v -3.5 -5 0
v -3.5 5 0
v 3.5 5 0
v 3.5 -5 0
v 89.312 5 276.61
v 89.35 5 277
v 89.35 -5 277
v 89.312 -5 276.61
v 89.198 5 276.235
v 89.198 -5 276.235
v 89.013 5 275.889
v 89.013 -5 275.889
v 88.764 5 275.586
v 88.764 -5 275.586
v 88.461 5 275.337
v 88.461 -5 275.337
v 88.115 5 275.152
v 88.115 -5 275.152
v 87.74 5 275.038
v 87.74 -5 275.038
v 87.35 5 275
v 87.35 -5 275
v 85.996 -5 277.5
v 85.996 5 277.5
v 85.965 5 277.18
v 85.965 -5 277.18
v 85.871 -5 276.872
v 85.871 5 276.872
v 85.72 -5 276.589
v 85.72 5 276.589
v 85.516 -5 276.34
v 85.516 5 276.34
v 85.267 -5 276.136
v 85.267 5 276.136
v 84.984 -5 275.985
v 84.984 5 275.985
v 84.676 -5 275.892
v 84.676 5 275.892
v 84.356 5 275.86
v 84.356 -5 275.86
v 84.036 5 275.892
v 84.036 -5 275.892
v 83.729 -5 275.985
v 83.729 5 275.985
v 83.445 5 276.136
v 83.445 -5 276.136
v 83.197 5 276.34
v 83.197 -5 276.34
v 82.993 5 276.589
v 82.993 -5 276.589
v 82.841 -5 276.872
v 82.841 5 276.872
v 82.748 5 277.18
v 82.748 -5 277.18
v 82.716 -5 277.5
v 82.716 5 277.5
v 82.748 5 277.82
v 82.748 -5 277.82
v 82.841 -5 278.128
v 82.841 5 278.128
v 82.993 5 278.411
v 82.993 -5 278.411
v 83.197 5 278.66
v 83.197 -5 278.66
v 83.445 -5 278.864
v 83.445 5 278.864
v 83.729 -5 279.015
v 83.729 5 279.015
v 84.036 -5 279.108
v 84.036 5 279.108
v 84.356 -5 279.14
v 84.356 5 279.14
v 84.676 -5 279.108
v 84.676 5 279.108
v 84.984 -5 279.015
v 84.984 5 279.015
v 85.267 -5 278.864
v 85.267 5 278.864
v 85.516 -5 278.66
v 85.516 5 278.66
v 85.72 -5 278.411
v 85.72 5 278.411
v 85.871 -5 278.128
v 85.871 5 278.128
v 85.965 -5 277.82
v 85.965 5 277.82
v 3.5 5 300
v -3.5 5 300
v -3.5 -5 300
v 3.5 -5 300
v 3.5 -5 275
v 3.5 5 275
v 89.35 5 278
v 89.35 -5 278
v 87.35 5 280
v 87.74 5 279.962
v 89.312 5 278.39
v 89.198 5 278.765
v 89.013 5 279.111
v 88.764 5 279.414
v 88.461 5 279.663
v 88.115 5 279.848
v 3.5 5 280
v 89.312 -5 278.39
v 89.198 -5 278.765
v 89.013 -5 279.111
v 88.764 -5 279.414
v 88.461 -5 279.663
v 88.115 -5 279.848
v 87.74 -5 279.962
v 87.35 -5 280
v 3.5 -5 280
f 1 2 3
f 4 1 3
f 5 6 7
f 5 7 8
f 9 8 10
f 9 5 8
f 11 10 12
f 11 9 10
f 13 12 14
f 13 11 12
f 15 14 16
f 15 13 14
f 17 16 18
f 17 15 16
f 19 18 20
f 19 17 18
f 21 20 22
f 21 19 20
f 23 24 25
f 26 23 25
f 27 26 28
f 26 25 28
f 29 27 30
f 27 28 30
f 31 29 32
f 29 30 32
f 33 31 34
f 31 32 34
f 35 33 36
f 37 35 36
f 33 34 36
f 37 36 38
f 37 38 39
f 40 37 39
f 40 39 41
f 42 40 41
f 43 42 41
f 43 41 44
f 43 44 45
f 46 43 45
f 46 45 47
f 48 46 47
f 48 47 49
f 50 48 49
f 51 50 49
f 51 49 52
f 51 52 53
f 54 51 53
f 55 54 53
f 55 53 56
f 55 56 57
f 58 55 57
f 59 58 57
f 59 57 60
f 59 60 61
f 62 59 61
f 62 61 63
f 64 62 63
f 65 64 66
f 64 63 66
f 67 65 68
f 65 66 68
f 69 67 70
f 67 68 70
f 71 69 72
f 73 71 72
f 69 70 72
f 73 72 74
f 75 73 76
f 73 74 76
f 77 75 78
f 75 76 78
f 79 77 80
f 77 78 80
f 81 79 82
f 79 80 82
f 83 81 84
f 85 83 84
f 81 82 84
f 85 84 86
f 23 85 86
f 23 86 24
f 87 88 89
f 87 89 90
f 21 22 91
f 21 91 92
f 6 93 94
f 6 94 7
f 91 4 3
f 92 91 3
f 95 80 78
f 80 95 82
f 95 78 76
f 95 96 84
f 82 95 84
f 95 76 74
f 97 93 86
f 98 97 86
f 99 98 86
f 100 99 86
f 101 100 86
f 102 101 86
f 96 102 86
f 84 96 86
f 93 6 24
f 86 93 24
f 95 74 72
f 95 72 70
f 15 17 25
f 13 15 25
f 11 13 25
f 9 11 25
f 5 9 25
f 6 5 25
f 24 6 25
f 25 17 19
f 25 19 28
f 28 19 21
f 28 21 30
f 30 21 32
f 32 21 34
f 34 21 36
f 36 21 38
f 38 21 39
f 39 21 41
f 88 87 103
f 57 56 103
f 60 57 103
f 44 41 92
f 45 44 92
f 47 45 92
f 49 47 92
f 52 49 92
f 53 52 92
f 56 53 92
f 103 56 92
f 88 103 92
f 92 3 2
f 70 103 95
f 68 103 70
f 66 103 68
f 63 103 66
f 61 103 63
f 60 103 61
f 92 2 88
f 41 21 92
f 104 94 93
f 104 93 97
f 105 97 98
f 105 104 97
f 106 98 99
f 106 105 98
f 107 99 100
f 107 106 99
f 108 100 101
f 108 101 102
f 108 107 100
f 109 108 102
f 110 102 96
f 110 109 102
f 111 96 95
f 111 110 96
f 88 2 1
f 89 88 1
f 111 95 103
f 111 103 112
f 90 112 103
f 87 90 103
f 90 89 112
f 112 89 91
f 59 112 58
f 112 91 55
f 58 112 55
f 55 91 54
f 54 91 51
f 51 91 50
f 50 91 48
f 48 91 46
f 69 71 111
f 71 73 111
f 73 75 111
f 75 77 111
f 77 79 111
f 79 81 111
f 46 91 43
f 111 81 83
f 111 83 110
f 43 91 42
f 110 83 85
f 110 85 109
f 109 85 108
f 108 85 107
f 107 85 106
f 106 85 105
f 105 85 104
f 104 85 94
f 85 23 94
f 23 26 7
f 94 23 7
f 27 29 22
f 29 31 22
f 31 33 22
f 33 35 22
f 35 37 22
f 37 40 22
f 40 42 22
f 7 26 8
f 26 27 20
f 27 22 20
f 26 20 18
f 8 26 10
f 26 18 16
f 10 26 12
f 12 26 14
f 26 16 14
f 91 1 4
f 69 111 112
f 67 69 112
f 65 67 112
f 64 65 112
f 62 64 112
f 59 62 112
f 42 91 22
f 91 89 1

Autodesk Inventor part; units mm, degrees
ref_plane "YZ Plane" through (0, 0, 0) normal (1, 0, 0) x (0, 1, 0)
ref_plane "XZ Plane" through (0, 0, 0) normal (0, 1, 0) x (-1, 0, 0)
ref_plane "XY Plane" through (0, 0, 0) normal (0, 0, 1) x (1, 0, 0)
sketch "Sketch1" plane through (0, 0, 0) normal (0, 0, 1) x (1, 0, 0)
  line L0 (-3.5, -5) -> (3.5, -5)
  line L1 (3.5, -5) -> (3.5, 5)
  line L2 (3.5, 5) -> (-3.5, 5)
  line L3 (-3.5, 5) -> (-3.5, -5)
  line L4 (-3.5, -5) -> (3.5, 5) construction
  line L5 (3.5, -5) -> (-3.5, 5) construction
  point P0 (0, 0)
  dimension "d0" = 7
  dimension "d1" = 10
extrude "Extrusion1" add sketch "Sketch1" along normal blind 300
sketch "Sketch2" plane through (3.5, -5, 0) normal (1, 0, 0) x (0, 0, -1)
  point P0 (0, 5)
sketch "Sketch3" plane through (3.5, -5, 0) normal (1, 0, 0) x (0, 0, -1)
  line L0 (0, 10) -> (-300, 10) projected
  line L1 (0, 0) -> (-300, 0) projected
  line L2 (-275, 10) -> (-280, 10)
  line L3 (-280, 10) -> (-280, 0)
  line L4 (-280, 0) -> (-275, 0)
  line L5 (-275, 0) -> (-275, 10)
  line L6 (-300, 0) -> (-300, 10) projected
  point P0 (0, 5)
  point P1 (-275, 0)
  point P2 (-280, 10)
  dimension "d4" = 5
  dimension "d12" = 20
extrude "Extrusion2" add sketch "Sketch3" along normal blind 85.85 contours L5 L1 L3 L0
sketch "Sketch4" plane through (-3.5, 5, 300) normal (0, 1, 0) x (1, 0, 0)
  circle A0 centre (87.8562, 22.5) radius 1.64
  line L0 (7, 25) -> (92.85, 25) projected
  point P0 (3.5, 300)
  dimension "d7" = 3.28
  dimension "d8" = 2.5
extrude "Extrusion3" cut sketch "Sketch4" against normal through all
fillet "Fillet1" radius 2 2 edges at (89.35, 0, 275) (89.35, 0, 280)
properties part number "support_rod_left"
